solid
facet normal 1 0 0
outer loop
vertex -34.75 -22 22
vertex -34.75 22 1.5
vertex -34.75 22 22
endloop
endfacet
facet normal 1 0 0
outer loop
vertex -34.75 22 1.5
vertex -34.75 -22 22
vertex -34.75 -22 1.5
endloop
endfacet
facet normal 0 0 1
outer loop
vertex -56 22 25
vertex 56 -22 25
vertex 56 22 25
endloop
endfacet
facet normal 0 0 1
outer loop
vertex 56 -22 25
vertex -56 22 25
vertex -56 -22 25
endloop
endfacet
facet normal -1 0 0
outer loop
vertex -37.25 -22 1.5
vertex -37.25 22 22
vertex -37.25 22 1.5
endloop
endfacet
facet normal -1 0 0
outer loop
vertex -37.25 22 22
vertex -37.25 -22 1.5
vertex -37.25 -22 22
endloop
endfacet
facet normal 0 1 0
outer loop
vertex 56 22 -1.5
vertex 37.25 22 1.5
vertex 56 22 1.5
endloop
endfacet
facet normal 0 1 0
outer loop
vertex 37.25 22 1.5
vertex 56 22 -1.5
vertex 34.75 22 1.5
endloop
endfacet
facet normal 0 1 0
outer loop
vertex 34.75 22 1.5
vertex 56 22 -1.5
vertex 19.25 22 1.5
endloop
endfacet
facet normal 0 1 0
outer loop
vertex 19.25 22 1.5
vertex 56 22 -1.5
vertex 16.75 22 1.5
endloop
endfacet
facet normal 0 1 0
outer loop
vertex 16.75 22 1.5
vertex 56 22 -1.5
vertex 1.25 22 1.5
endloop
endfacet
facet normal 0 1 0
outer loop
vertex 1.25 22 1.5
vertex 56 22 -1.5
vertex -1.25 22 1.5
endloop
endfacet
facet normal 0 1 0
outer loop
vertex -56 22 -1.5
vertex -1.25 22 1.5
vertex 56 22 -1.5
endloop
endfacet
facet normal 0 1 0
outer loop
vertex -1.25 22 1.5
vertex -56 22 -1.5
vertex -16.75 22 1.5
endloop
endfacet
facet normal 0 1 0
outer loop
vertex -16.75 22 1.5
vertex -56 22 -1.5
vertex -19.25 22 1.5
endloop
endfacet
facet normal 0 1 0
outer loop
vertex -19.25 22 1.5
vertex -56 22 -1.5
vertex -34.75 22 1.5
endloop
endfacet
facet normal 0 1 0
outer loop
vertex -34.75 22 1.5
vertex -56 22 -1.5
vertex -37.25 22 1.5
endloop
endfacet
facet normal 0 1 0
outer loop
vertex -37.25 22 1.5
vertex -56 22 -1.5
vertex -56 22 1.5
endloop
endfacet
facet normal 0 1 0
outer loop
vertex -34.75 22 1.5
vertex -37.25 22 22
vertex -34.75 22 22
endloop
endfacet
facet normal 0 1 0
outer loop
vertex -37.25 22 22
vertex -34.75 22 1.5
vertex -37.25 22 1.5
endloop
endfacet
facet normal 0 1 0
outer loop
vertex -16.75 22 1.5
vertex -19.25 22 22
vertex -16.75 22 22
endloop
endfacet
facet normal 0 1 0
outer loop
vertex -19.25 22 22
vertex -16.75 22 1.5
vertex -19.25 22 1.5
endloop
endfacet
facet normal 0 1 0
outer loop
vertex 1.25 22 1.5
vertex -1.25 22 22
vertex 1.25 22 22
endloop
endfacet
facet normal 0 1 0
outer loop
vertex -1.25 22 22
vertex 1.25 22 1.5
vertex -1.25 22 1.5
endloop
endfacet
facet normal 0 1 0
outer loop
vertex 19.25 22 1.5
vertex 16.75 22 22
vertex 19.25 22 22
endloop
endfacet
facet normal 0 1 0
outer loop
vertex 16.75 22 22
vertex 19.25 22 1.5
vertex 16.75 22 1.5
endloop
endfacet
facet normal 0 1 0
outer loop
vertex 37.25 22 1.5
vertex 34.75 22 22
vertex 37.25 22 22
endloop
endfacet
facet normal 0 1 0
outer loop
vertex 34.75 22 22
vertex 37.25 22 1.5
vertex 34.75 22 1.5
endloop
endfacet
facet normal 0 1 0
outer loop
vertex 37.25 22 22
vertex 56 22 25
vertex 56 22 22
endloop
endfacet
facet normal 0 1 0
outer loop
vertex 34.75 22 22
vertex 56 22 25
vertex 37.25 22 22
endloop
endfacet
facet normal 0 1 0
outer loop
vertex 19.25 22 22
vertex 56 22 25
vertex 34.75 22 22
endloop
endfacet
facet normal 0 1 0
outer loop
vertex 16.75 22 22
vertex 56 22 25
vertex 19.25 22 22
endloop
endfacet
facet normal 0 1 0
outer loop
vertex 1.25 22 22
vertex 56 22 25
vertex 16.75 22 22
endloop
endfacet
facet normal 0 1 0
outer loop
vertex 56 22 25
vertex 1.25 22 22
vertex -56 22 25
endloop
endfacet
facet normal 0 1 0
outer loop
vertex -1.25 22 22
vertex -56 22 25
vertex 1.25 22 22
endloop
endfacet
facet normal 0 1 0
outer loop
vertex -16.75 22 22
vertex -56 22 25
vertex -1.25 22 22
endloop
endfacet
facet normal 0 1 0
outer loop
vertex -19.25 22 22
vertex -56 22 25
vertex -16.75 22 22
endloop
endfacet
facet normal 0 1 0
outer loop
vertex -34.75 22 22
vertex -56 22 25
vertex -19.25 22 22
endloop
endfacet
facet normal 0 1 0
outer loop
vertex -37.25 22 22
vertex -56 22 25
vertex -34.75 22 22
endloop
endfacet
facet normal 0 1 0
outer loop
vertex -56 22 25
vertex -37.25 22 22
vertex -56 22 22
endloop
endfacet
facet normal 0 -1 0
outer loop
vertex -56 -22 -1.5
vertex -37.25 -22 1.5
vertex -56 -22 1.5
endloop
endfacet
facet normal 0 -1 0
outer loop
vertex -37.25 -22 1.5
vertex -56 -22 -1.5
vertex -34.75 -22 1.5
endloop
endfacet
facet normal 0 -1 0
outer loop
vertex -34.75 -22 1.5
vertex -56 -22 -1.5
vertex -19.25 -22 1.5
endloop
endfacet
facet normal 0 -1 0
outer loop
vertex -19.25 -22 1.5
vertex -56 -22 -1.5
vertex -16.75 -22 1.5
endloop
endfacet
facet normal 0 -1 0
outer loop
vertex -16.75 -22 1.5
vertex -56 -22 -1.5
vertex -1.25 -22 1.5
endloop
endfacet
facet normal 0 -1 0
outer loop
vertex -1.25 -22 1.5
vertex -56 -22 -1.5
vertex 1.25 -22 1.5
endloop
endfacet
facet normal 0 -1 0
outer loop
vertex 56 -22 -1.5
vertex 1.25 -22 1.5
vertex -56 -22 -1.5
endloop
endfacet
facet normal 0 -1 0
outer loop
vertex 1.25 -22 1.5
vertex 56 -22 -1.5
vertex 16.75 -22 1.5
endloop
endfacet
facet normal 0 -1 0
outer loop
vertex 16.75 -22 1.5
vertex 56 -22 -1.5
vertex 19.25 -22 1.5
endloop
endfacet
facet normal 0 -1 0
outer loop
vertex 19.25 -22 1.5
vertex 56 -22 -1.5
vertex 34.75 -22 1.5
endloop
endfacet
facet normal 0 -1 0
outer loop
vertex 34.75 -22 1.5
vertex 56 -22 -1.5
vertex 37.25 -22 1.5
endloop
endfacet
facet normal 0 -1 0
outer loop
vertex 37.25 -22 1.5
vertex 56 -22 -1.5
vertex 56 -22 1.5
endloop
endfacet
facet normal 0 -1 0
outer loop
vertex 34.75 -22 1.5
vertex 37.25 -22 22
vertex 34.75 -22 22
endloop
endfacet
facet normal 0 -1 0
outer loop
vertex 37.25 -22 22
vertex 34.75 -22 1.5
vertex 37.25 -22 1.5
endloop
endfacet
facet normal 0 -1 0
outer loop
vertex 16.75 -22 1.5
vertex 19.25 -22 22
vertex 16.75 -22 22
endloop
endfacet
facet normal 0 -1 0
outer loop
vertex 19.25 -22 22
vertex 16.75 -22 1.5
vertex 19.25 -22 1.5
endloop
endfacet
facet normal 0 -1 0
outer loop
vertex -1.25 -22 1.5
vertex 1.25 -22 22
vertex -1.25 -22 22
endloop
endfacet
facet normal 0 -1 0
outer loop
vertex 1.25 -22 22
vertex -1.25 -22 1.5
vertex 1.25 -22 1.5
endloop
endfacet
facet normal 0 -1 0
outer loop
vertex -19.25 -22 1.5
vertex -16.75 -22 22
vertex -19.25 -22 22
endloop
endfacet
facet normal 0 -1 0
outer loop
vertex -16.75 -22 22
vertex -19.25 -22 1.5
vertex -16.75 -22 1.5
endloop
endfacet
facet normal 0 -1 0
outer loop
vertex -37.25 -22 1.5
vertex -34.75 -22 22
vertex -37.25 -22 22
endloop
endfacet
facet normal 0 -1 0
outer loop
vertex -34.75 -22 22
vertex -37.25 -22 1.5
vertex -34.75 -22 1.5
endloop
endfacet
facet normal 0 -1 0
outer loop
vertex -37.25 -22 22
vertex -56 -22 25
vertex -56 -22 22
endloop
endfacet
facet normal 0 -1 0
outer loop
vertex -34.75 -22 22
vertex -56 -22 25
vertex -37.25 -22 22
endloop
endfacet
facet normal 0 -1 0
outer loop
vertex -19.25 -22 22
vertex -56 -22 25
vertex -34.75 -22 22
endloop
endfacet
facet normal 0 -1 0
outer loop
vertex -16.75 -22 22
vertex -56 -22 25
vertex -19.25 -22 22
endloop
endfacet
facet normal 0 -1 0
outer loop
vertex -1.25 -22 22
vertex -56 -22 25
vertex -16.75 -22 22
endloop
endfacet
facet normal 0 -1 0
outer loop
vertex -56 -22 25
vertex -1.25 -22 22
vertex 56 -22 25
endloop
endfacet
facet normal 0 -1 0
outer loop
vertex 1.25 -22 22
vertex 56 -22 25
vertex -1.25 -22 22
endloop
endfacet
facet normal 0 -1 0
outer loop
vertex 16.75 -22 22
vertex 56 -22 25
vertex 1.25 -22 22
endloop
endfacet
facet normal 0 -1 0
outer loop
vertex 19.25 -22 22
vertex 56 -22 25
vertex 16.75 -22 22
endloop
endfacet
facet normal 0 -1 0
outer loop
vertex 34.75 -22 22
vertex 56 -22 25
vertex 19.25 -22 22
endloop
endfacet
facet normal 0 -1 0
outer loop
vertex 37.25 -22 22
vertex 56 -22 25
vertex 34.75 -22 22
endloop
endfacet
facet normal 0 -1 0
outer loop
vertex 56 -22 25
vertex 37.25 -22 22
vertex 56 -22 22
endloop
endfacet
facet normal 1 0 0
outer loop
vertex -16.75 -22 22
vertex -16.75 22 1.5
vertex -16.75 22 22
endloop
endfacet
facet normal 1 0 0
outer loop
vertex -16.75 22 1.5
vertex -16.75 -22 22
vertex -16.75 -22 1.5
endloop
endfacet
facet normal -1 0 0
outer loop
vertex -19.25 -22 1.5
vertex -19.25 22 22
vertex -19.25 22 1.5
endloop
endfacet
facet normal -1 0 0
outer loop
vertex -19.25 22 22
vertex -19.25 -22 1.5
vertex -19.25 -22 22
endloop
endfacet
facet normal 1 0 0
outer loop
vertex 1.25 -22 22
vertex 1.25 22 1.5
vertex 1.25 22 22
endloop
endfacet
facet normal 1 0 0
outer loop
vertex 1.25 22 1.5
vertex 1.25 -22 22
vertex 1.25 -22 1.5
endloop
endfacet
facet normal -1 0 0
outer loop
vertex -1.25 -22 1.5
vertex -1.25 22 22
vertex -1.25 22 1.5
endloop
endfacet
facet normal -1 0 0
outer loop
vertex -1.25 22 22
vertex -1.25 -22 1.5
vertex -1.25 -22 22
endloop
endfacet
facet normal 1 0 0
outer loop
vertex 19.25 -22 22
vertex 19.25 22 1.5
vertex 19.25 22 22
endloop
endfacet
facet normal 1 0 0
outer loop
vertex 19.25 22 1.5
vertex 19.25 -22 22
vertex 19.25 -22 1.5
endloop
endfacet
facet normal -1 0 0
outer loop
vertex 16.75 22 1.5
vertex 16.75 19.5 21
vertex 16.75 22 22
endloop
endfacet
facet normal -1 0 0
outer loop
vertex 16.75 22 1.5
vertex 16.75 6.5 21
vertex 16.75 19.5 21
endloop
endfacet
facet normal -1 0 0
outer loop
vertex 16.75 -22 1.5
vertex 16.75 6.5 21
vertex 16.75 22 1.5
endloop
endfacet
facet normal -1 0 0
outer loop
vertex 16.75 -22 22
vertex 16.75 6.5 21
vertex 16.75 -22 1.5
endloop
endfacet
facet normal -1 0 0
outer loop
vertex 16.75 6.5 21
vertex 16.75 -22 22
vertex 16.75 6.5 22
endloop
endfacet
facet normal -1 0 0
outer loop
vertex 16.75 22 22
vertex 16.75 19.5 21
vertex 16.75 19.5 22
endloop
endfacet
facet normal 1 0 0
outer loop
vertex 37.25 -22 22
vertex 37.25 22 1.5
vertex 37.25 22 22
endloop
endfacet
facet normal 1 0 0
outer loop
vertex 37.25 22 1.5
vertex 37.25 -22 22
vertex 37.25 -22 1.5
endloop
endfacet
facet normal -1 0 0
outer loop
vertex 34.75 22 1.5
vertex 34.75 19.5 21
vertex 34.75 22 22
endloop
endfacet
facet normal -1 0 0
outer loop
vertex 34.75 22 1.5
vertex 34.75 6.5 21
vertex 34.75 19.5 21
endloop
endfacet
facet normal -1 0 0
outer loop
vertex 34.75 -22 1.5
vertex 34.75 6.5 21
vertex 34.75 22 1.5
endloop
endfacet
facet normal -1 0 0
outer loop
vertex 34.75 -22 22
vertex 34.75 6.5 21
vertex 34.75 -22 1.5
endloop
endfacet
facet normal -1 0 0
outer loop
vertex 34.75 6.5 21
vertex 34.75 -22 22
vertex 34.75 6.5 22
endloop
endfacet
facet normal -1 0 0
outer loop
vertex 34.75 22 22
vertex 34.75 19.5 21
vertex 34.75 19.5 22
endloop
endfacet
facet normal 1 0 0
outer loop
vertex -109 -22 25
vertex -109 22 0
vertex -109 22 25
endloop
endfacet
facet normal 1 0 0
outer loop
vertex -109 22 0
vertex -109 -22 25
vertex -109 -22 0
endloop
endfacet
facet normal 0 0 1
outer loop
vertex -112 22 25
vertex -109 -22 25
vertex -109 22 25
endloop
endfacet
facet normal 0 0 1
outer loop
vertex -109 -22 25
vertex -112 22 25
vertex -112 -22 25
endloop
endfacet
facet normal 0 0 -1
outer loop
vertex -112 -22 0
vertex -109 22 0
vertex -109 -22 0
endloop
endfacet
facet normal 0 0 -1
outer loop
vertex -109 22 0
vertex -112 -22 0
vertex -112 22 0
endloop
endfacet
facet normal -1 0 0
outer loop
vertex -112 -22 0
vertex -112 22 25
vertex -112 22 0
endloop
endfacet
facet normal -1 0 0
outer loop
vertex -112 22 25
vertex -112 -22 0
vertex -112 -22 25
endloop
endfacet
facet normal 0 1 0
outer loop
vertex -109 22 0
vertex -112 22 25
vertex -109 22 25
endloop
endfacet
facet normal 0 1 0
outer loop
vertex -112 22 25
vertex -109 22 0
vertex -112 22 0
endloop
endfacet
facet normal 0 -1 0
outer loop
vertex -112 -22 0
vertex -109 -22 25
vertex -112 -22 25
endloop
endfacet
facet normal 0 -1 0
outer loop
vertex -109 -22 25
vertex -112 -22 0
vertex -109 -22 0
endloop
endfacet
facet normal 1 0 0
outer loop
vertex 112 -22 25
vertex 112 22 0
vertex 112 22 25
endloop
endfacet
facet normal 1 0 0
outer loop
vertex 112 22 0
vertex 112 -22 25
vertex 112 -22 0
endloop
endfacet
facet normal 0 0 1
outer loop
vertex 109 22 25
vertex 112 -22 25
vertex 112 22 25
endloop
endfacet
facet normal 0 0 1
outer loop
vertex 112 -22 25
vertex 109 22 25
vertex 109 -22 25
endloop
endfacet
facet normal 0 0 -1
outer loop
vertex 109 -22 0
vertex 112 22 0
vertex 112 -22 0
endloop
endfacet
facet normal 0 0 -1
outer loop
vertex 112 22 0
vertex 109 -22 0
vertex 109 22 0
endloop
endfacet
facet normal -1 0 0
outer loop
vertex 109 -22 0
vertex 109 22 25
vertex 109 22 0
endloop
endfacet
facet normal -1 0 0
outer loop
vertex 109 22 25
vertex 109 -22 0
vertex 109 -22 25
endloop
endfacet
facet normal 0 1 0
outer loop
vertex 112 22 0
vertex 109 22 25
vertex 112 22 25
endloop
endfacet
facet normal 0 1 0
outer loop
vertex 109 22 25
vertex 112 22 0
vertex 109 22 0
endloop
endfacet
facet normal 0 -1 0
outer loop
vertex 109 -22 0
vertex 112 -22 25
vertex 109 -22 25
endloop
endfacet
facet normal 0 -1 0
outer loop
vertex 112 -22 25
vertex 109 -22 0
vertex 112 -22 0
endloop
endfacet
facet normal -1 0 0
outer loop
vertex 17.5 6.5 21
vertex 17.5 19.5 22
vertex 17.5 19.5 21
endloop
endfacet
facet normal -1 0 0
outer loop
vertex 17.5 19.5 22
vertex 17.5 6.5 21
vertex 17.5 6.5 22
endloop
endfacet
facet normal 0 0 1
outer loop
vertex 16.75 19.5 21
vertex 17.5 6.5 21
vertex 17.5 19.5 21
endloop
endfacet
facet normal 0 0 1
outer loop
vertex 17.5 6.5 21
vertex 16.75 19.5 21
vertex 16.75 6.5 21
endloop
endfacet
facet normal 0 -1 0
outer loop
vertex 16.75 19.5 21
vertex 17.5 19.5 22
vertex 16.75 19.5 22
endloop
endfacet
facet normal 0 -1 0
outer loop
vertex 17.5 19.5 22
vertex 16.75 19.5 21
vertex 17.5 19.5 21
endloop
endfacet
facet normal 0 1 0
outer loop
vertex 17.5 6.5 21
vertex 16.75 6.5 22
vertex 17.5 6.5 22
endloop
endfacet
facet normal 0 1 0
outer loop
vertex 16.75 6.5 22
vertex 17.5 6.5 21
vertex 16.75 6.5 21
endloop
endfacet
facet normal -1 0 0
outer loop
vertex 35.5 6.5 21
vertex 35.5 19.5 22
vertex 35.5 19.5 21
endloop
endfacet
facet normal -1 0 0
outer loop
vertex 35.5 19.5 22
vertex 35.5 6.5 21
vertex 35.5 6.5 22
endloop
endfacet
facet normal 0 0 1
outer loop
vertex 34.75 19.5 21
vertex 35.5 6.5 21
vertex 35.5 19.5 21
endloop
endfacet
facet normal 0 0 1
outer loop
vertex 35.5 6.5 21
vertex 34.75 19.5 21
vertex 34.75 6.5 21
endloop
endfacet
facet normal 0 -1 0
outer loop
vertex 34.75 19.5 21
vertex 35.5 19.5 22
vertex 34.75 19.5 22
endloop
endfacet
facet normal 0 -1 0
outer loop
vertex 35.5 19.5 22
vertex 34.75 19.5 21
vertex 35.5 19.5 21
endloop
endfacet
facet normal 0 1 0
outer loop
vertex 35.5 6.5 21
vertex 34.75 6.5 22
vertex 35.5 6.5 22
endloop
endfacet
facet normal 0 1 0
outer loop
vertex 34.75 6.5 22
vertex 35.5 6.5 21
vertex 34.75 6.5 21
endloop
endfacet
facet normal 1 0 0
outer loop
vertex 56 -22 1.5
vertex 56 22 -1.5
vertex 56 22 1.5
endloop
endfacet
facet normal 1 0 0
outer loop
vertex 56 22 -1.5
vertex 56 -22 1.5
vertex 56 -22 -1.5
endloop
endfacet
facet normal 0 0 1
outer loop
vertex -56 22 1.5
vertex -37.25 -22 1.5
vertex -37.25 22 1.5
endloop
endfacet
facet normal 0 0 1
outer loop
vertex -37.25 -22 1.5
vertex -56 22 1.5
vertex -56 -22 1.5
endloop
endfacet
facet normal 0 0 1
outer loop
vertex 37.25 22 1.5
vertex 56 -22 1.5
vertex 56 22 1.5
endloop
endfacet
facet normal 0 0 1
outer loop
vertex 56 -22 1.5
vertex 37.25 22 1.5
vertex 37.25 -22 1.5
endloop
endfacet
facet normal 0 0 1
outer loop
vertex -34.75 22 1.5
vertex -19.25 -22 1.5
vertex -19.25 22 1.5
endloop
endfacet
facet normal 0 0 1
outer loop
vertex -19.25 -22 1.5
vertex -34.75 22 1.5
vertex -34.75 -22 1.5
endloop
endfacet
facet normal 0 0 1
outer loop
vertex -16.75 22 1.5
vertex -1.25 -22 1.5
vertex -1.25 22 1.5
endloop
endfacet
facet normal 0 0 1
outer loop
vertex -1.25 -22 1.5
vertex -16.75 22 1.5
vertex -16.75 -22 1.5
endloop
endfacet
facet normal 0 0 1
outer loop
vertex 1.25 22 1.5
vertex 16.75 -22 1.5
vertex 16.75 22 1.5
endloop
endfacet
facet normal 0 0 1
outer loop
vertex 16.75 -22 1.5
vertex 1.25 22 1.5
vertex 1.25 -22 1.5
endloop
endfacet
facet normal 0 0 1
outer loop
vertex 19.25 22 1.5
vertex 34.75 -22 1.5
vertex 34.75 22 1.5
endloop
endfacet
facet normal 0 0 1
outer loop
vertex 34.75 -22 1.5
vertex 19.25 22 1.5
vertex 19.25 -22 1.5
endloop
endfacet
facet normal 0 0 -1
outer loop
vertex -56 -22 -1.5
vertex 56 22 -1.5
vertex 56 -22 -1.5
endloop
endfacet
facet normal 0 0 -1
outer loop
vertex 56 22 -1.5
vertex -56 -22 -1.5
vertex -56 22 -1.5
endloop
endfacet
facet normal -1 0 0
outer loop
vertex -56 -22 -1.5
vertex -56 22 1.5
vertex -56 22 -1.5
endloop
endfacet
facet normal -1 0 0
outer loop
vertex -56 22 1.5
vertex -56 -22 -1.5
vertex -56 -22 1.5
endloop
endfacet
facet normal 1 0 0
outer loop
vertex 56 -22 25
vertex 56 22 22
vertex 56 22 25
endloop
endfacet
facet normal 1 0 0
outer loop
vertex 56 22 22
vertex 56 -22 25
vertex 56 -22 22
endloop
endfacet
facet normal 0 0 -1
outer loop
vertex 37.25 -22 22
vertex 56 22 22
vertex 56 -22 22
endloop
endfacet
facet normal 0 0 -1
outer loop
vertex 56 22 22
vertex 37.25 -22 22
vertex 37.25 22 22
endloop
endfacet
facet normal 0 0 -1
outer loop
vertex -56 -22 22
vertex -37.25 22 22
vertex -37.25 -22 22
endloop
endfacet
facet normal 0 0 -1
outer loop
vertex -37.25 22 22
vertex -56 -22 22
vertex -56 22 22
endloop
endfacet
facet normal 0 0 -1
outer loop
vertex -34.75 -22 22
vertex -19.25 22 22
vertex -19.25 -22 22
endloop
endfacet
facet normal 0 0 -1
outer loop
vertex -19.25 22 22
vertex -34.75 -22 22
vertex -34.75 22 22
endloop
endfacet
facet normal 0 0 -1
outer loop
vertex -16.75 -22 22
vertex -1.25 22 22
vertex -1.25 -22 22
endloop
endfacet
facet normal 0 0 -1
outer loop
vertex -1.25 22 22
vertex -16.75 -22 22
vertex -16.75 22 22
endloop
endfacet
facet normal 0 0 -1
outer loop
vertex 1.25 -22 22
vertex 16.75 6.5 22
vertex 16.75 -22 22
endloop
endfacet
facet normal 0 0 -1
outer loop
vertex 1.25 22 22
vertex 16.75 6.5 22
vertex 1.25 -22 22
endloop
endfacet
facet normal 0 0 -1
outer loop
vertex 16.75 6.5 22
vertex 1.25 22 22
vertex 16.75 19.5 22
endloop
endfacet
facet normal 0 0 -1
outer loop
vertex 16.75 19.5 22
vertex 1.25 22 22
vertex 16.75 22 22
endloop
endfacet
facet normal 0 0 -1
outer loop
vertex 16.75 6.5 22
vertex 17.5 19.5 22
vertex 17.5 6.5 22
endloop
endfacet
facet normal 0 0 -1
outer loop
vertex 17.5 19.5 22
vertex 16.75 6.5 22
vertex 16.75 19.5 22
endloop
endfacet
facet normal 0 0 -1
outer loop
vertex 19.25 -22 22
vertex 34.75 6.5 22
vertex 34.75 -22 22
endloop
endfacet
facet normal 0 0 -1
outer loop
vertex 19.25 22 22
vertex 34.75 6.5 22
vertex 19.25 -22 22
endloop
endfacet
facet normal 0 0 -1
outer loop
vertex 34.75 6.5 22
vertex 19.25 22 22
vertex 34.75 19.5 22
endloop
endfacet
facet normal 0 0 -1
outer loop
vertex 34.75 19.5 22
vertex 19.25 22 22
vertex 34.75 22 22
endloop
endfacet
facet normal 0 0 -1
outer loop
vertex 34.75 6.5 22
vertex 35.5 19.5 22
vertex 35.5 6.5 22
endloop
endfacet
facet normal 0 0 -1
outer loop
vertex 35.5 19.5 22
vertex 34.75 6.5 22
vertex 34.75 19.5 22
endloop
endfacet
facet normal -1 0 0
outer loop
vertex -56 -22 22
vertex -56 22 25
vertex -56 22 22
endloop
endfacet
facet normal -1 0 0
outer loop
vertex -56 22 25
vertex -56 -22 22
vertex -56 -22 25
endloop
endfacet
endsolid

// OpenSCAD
// --- Dimensions ---
base_width_x = 112;       // Total width of the base plate (X)
base_depth_y = 44;        // Total depth of the base plate (Y)
base_thickness = 3;       // Thickness of the base plate (Z)

deck_width_x = 112;       // Total width of the deck plate (X)
deck_depth_y = 44;        // Total depth of the deck plate (Y)
deck_z_start = 22;        // Z-coordinate where the deck starts
deck_thickness = 3;       // Thickness of the deck plate (Z)

end_wall_thickness = 3;   // Thickness of the two end walls
rib_thickness = 2.5;      // Thickness of the five internal ribs
wall_height = 25;         // Total height of the upright walls (Z)

// Hole dimensions (for 12.5mm cuvettes)
hole_size = 13;           // Width and depth of the square holes
hole_spacing_x = 18;      // Center-to-center spacing along X
hole_spacing_y = 18;      // Center-to-center spacing along Y
rows = 2;                 // Number of rows along Y
cols = 6;                 // Number of columns along X

/* [Render Settings] */
$fn = 64;

// --- Main Assembly ---

union() {
    // 1. The Base Plate
    translate([0, 0, 0])
        cube([base_width_x, base_depth_y, base_thickness], center = true);

    // 2. The Deck Plate
    translate([0, 0, deck_z_start + deck_thickness/2])
        cube([deck_width_x, deck_depth_y, deck_thickness], center = true);

    // 3. The Upright Walls (End walls and Ribs)
    // We use a union for the walls, then subtract the holes from the whole assembly later
    difference() {
        // The solid walls structure
        union() {
            // Two End Walls (flush with short ends)
            // Positioned at X = +/- (base_width_x/2 - end_wall_thickness/2)
            // Since they are flush with the edges, we center them on the edge
            translate([-(base_width_x - end_wall_thickness/2), 0, wall_height/2])
                cube([end_wall_thickness, base_depth_y, wall_height], center = true);
            
            translate([(base_width_x - end_wall_thickness/2), 0, wall_height/2])
                cube([end_wall_thickness, base_depth_y, wall_height], center = true);

            // Five Ribs
            // Rib positions: -36, -18, 0, 18, 36
            rib_positions_x = [-36, -18, 0, 18, 36];
            for (rx = rib_positions_x) {
                translate([rx, 0, wall_height/2])
                    cube([rib_thickness, base_depth_y, wall_height], center = true);
            }
        }

        // 4. The 12 Square Through-Holes
        // Holes are cut through the deck plate. 
        // To ensure a clean cut, we make the hole slightly taller than the deck.
        // The holes are centered on the deck.
        // The deck is at Z = 22 to 25.
        
        // Calculate starting offset to center the grid on the deck
        // Grid width = (cols-1)*spacing_x = 5 * 18 = 90. 
        // Grid height = (rows-1)*spacing_y = 1 * 18 = 18.
        // Offset = (Total_Dim - Grid_Dim) / 2
        offset_x = (deck_width_x - (cols - 1) * hole_spacing_x) / 2;
        offset_y = (deck_depth_y - (rows - 1) * hole_spacing_y) / 2;

        // We translate the hole cutter to the deck's Z center
        translate([0, 0, deck_z_start + deck_thickness/2])
        for (i = [0 : cols - 1]) {
            for (j = [0 : rows - 1]) {
                translate([
                    offset_x + i * hole_spacing_x, 
                    offset_y + j * hole_spacing_y, 
                    0
                ])
                // Cube is slightly taller than deck to ensure clean cut
                cube([hole_size, hole_size, deck_thickness + 2], center = true);
            }
        }
    }
}

// Note: The base plate is at Z=0 to 3. 
// The code above uses center=true for the base plate, so it sits from Z=-1.5 to 1.5.
// To fix the requirement "lies on the bed (z = 0 to 3)", we adjust the base plate translation.
// However, to keep the code clean, I will re-write the base plate part specifically.

// RE-WRITING BASE PLATE TO BE Z=0 TO 3
// (Replacing the first cube in the union above)
// Since I cannot "replace" in a single block without re-writing, 
// I will provide the final corrected logic below.
